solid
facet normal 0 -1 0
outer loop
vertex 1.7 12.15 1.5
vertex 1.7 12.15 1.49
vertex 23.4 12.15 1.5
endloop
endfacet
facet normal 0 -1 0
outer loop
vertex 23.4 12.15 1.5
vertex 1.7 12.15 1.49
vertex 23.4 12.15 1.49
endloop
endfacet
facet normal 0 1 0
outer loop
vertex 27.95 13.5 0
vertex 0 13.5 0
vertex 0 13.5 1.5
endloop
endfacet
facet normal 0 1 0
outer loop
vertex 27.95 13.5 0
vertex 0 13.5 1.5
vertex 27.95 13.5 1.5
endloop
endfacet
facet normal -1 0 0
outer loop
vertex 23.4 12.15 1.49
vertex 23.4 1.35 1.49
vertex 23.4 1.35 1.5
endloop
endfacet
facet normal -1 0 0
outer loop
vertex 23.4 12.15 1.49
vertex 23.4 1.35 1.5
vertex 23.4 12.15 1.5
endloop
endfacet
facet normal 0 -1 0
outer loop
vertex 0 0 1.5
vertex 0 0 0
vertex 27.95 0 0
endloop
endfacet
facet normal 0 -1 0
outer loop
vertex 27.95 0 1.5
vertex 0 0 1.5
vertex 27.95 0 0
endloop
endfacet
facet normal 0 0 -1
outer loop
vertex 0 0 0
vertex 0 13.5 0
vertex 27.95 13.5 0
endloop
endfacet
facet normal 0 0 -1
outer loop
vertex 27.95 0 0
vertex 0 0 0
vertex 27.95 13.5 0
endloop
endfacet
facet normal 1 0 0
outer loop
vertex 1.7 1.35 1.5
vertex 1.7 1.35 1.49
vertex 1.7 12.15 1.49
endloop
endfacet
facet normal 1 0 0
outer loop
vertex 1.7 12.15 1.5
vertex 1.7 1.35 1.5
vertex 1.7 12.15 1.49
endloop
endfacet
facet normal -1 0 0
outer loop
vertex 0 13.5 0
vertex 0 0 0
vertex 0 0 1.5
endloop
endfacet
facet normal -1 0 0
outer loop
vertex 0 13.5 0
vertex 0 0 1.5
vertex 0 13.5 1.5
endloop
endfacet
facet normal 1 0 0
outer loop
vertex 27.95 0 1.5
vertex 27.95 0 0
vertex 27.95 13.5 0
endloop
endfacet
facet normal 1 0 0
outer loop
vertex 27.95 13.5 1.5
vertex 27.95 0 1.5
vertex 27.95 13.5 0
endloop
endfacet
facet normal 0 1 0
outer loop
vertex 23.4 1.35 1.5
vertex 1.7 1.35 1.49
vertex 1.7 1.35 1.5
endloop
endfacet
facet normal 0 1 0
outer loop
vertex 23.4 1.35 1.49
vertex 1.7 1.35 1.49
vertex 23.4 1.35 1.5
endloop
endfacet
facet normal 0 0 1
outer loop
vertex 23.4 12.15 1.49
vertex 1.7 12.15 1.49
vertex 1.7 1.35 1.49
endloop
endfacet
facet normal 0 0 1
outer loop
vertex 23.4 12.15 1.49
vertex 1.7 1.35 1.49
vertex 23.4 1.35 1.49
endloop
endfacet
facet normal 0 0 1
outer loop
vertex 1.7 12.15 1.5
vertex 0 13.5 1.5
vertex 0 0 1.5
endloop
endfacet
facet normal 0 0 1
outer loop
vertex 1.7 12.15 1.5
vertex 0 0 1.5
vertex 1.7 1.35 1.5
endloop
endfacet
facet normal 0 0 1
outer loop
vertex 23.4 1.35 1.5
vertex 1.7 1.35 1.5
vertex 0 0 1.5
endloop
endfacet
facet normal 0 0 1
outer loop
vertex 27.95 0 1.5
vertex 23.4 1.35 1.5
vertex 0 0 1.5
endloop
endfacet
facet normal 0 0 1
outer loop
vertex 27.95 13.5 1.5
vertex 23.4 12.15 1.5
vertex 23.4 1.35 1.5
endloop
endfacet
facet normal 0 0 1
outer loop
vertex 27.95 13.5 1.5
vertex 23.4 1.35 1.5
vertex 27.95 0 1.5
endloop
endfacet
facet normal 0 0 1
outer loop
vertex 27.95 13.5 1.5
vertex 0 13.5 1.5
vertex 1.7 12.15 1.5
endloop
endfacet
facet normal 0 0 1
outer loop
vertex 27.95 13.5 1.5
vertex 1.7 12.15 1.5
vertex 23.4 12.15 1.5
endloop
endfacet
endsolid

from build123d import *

# Parameters (mm, degrees)
SKETCH_1_W      = 27.95
SKETCH_1_H      = 13.5
SKETCH_1_W_2    = 21.7
SKETCH_1_H_2    = 10.8
EXTRUDE_1_DEPTH = 1.5
SKETCH_1_2_W    = 21.7
SKETCH_1_2_H    = 10.8
EXTRUDE_2_DEPTH = 1.49


with BuildPart() as part:
    # 草图1 → 凸台-拉伸1 (new body)
    with BuildSketch(Plane.XY):
        with Locations((13.975, 6.75)):
            Rectangle(SKETCH_1_W, SKETCH_1_H)
        with Locations((12.55, 6.75)):
            Rectangle(SKETCH_1_W_2, SKETCH_1_H_2, mode=Mode.SUBTRACT)
    extrude(amount=EXTRUDE_1_DEPTH)

    # 草图1<2> → 凸台-拉伸2 (add)
    with BuildSketch(Plane.XY):
        with Locations((12.55, 6.75)):
            Rectangle(SKETCH_1_2_W, SKETCH_1_2_H)
    extrude(amount=EXTRUDE_2_DEPTH)


solid = part.part
